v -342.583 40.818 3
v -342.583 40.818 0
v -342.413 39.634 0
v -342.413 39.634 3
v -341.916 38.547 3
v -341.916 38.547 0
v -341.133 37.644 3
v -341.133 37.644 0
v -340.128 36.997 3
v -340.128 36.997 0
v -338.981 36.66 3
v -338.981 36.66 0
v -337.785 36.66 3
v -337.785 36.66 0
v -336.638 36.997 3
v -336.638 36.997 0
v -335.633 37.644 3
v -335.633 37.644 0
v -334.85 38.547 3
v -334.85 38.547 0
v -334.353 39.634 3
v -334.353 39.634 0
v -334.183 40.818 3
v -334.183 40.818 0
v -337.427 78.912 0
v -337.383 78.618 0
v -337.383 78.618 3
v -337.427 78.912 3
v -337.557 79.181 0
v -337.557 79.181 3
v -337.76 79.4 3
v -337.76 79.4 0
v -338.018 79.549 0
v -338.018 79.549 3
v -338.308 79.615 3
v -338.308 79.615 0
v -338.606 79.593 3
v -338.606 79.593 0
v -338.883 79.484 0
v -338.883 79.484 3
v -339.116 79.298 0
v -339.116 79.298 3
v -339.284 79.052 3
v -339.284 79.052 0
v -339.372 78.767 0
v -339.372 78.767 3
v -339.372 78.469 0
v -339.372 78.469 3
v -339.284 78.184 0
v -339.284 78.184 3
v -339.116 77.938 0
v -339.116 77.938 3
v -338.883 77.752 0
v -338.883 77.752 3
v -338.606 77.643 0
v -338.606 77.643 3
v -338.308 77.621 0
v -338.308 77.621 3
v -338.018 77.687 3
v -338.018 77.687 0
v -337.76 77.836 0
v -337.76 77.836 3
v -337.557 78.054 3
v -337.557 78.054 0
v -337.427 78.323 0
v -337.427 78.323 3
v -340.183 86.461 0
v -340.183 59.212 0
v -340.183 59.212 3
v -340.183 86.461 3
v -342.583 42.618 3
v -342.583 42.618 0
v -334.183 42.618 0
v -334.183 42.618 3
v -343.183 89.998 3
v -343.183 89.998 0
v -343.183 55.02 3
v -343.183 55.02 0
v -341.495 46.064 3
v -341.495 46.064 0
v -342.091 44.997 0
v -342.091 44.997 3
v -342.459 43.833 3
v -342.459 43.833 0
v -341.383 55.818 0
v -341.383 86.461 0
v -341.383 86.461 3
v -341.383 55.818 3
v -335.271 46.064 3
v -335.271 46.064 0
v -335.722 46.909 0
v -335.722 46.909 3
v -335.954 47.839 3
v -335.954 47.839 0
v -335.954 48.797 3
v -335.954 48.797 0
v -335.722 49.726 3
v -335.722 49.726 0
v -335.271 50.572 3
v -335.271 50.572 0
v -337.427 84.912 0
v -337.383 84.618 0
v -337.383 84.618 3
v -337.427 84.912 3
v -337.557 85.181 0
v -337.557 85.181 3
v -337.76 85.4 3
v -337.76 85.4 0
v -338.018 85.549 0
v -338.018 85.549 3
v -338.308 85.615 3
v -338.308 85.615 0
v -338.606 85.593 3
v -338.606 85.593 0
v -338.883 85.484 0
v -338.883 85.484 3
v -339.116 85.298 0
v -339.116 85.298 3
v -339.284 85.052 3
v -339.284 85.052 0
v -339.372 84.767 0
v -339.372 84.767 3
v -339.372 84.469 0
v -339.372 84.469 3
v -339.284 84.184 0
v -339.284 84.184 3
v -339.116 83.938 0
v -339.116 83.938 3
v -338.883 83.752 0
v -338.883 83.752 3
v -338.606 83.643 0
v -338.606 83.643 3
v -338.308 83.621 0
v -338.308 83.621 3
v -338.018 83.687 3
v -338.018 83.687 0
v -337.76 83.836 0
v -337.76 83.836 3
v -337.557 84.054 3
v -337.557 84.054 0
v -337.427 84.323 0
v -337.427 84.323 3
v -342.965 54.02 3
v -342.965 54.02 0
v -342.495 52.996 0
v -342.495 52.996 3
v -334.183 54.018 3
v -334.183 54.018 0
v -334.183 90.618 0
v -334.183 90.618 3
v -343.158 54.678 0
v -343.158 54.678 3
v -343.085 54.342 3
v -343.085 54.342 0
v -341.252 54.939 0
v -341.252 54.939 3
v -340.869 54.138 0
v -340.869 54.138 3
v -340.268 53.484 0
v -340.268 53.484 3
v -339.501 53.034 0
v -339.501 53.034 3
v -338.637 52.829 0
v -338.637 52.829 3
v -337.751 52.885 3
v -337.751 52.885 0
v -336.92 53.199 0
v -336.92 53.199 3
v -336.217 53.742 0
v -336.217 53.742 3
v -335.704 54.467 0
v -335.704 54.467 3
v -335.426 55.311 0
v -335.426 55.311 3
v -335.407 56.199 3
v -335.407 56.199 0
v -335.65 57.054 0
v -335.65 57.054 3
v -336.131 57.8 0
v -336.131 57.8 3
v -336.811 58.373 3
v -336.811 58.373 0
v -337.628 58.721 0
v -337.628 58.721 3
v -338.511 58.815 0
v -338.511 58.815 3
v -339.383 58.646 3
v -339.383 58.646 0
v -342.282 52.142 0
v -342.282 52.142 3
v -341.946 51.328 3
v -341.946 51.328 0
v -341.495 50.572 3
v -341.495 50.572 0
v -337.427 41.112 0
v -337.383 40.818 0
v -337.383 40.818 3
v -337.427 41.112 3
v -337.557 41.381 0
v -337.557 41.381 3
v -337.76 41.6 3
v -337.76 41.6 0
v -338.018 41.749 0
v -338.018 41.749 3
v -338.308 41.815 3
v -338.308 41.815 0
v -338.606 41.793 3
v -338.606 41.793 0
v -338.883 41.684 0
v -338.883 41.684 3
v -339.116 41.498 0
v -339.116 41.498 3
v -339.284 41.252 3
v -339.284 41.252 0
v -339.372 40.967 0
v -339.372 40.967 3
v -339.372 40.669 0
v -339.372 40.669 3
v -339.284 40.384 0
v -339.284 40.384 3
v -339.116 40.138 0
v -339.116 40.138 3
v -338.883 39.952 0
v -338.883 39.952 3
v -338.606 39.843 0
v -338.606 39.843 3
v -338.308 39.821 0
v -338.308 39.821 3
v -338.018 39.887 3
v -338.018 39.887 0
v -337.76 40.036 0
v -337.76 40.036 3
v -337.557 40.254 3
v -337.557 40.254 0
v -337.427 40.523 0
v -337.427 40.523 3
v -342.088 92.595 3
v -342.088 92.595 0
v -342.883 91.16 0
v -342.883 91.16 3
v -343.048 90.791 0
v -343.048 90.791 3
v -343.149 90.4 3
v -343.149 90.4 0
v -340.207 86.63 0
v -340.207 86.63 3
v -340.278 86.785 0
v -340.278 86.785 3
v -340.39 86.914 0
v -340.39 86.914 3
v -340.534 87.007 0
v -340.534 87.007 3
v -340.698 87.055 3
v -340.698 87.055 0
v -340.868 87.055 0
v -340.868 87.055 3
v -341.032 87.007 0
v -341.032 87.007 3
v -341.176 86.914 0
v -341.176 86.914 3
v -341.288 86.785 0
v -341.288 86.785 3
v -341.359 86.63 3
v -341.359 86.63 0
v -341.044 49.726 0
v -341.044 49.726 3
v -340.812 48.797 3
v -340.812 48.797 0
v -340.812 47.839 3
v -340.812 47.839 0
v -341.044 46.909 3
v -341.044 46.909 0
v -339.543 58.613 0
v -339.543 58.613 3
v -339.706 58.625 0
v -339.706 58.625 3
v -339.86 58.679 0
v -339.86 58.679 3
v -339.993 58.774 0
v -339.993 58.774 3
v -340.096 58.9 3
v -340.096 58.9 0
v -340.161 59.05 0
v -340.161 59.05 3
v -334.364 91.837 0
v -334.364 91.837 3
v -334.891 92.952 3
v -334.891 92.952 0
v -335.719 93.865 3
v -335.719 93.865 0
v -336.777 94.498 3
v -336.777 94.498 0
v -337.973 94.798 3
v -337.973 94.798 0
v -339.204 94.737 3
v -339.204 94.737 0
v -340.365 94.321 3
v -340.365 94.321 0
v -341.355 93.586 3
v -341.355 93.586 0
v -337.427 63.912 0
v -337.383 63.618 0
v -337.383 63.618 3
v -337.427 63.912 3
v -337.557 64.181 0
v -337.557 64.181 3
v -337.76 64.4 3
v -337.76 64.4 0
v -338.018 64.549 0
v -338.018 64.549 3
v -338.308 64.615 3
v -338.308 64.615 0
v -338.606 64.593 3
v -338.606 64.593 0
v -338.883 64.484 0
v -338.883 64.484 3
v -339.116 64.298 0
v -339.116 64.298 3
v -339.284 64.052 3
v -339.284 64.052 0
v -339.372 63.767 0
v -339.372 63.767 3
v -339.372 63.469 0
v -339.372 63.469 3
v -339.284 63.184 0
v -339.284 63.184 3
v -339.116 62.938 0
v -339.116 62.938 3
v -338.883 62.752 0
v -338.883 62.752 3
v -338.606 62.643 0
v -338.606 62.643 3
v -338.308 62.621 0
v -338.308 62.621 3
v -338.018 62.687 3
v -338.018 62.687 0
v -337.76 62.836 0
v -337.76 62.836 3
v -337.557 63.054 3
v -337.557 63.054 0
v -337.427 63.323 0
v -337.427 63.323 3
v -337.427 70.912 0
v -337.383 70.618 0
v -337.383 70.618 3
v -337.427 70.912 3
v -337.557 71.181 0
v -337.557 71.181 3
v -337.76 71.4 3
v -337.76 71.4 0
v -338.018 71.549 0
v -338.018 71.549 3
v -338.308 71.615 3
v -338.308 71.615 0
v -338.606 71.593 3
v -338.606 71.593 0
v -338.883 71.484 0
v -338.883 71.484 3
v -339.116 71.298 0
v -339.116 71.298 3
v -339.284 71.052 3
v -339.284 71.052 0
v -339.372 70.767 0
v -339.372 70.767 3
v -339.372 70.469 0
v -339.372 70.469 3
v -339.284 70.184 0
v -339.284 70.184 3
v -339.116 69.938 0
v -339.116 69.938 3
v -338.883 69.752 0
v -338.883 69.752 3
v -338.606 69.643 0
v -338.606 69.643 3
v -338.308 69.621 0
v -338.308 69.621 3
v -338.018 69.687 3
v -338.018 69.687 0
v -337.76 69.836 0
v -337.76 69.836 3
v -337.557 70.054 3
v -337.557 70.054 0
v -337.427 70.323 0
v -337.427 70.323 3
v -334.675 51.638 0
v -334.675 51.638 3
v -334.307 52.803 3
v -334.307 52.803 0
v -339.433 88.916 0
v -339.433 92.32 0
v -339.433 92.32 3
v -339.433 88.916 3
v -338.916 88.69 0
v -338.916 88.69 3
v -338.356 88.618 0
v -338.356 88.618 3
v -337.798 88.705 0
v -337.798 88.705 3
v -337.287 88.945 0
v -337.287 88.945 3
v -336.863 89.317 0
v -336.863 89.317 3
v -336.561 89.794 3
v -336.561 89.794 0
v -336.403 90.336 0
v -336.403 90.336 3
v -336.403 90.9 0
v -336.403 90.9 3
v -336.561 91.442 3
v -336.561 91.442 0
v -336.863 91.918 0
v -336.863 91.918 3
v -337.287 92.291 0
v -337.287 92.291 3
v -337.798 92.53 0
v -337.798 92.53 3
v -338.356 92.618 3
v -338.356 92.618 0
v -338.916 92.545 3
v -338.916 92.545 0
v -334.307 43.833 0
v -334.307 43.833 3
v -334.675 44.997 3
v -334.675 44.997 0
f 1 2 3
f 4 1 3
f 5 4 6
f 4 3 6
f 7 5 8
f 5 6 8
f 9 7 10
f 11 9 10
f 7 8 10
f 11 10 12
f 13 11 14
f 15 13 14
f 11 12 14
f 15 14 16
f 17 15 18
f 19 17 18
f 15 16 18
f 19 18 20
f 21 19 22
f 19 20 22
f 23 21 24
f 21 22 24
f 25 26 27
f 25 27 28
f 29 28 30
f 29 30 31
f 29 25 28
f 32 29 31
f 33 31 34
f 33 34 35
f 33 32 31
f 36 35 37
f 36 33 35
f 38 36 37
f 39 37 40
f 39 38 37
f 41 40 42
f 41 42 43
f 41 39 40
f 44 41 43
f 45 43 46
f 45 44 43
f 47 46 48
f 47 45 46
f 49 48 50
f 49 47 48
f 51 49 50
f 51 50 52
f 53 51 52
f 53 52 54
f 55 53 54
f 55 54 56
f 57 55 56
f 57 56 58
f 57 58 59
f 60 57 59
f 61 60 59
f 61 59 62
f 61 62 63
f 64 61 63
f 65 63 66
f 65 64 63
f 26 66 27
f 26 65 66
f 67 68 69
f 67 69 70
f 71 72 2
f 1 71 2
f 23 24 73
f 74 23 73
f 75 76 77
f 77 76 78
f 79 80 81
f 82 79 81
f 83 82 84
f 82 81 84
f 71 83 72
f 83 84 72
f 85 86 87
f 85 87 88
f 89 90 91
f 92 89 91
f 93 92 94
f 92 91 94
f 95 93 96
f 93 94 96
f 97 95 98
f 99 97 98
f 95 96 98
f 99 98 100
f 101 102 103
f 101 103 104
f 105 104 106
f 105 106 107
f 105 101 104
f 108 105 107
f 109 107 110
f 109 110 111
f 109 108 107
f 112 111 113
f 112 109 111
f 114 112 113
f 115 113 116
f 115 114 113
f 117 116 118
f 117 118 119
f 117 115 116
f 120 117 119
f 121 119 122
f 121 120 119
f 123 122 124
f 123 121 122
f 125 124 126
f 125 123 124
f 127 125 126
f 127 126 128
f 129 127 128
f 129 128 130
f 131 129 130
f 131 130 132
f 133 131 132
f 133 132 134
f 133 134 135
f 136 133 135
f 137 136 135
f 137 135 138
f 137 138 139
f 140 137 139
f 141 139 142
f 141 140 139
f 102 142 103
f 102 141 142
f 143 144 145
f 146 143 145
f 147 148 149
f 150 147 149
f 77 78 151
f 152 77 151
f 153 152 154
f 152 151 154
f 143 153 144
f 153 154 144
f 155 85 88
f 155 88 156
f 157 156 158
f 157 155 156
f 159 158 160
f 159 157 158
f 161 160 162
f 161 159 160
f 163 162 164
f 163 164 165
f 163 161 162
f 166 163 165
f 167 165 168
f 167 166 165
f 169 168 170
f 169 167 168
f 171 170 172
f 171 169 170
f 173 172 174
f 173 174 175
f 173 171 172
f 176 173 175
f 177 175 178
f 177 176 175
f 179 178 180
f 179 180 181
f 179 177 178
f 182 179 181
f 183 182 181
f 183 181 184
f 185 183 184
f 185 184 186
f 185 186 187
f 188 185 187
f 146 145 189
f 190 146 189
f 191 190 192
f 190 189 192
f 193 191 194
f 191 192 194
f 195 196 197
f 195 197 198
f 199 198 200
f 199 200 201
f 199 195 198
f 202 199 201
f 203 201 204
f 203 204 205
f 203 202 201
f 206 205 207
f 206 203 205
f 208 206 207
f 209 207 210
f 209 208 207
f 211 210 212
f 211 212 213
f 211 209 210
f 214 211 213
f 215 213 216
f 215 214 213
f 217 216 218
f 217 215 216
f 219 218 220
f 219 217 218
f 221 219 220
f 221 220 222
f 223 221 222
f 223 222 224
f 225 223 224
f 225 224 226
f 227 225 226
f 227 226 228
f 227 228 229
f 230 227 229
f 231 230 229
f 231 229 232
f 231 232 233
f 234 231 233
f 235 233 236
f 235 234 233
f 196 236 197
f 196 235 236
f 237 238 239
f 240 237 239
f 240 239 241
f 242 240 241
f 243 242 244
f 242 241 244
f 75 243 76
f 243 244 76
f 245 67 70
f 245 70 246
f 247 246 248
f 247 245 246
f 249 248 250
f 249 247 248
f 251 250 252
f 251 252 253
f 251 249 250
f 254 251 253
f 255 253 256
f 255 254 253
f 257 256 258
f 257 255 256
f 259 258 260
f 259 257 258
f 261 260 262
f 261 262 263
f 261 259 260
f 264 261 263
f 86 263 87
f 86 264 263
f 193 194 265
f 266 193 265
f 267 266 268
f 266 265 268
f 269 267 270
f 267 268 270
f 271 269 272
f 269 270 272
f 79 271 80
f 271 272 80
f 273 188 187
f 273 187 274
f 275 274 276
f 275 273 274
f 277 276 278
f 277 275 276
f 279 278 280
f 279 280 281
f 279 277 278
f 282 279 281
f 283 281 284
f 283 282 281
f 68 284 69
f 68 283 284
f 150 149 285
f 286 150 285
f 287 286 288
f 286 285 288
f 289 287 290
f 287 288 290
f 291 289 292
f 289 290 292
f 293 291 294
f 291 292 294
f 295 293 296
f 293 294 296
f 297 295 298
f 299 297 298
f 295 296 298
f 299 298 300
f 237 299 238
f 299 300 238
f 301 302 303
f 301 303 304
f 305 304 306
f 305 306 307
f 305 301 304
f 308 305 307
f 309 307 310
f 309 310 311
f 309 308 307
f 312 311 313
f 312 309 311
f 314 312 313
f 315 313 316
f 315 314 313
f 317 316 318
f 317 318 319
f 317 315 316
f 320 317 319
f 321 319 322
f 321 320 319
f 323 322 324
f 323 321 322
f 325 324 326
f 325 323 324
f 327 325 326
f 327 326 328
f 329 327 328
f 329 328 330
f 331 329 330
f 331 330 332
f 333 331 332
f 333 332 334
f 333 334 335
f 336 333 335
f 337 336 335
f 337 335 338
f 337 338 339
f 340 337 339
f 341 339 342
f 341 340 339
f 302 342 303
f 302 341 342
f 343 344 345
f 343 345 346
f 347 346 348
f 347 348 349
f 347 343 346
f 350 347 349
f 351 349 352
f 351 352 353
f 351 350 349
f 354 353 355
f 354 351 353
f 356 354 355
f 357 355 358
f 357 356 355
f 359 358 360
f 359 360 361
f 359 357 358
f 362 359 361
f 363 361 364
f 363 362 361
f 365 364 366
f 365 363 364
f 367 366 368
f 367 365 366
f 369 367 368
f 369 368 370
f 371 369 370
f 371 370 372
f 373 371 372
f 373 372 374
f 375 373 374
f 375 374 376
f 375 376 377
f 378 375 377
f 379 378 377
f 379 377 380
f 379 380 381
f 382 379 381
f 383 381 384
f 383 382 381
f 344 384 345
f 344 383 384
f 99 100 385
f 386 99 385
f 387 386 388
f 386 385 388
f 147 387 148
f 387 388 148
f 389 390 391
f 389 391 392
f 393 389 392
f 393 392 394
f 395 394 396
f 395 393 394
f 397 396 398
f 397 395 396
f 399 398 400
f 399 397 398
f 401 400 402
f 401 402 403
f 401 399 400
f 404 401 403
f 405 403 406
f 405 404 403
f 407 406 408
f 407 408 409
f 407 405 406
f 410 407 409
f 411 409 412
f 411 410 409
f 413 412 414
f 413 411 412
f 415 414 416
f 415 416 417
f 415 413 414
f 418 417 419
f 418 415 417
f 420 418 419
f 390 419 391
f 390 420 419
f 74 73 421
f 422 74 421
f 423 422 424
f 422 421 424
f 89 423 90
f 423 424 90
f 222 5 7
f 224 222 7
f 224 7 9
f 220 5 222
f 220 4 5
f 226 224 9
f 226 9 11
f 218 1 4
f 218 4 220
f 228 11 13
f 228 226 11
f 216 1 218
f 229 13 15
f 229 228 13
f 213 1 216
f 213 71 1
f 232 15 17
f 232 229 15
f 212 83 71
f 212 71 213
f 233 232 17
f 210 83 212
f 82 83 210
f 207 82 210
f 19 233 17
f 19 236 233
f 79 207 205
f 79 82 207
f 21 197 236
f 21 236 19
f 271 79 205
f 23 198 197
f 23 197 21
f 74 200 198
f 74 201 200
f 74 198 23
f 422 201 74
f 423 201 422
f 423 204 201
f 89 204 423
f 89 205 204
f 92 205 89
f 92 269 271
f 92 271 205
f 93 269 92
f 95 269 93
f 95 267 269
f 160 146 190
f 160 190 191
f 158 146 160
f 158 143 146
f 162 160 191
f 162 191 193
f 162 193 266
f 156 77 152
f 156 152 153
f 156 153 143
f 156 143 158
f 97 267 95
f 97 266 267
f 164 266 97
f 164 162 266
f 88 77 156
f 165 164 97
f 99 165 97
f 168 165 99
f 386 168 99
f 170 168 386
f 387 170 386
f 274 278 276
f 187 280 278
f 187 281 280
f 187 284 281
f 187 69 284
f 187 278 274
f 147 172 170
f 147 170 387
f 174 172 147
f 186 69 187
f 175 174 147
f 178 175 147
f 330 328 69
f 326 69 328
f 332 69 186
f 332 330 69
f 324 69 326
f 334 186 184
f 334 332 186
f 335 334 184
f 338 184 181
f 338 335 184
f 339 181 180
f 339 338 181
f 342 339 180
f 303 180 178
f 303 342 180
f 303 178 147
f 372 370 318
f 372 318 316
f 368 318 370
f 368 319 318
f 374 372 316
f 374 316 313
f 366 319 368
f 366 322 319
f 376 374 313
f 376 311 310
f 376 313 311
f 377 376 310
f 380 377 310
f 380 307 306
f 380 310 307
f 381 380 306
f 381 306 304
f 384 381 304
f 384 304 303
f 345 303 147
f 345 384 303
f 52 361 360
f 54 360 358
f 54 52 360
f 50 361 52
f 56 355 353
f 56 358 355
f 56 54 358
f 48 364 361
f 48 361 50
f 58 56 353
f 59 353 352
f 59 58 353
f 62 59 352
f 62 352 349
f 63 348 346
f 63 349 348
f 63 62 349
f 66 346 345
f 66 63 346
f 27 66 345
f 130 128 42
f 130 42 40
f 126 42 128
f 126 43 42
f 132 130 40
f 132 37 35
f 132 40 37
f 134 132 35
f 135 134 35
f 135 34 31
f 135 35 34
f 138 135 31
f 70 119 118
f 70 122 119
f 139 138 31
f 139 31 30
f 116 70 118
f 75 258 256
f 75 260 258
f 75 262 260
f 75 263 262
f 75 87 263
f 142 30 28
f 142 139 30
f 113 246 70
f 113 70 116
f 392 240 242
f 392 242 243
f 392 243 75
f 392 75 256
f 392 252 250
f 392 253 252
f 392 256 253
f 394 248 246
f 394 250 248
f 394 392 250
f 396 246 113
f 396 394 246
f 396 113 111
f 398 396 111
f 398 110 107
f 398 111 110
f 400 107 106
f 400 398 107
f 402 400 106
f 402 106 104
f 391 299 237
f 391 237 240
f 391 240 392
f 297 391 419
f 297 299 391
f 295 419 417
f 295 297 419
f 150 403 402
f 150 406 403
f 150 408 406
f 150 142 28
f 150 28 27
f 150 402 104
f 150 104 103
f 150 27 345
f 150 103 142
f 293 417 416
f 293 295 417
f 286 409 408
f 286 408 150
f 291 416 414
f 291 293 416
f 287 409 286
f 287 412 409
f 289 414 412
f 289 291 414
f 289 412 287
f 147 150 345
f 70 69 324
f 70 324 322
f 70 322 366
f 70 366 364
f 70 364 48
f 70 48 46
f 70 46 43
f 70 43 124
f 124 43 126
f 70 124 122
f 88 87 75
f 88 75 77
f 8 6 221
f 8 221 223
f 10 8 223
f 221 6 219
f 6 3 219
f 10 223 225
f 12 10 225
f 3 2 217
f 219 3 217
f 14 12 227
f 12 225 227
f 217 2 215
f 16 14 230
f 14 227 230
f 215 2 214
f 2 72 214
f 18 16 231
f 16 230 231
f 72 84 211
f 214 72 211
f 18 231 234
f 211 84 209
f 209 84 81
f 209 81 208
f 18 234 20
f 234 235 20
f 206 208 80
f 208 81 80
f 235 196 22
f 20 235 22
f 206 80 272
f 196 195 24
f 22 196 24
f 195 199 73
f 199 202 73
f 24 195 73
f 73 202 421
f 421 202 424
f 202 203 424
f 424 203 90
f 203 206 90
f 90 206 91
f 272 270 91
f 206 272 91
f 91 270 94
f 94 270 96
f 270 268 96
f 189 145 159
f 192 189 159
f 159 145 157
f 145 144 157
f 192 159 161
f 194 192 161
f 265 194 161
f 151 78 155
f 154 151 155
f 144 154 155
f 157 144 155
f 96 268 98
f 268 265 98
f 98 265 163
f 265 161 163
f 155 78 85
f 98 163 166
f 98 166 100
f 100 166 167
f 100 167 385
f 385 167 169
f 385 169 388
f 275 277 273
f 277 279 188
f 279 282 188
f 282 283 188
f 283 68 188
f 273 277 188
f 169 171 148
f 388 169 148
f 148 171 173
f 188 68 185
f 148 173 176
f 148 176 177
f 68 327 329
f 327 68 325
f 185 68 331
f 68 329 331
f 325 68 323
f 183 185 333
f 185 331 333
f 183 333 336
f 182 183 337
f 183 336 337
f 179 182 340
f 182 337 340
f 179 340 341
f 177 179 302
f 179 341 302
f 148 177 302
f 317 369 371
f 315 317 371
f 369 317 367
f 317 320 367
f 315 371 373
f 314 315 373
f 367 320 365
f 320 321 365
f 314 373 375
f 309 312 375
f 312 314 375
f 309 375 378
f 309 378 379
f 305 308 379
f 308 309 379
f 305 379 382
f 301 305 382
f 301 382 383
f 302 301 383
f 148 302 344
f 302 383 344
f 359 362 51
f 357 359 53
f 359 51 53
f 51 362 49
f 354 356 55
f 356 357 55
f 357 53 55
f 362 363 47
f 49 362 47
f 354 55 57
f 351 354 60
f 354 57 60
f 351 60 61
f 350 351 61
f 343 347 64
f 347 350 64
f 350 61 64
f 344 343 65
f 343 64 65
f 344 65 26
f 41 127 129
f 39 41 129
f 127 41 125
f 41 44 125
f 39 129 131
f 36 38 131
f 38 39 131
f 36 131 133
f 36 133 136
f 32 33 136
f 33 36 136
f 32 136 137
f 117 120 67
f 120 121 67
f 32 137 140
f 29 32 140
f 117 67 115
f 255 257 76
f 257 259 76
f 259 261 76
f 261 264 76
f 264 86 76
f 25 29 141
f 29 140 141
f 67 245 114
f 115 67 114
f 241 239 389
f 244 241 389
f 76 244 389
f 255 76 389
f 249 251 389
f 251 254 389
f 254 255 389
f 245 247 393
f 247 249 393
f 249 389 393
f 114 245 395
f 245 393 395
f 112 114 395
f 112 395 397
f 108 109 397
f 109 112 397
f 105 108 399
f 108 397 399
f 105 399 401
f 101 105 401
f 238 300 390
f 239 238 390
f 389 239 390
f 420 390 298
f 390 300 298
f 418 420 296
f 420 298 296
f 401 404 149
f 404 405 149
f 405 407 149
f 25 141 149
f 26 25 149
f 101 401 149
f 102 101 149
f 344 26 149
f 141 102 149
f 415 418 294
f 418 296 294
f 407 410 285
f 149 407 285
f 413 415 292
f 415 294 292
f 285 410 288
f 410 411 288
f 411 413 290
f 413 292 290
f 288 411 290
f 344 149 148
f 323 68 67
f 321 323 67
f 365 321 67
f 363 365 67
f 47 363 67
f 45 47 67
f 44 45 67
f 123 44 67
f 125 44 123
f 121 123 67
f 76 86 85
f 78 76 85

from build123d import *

# Parameters (mm, degrees)
SKETCH_1_R      = 1
EXTRUDE_1_DEPTH = 3


with BuildPart() as part:
    # 草图1 → 凸台-拉伸1 (new body)
    with BuildSketch(Plane.XY):
        with BuildLine():
            Line((-334.183039587, 54.017725717), (-334.183039587, 90.617725717))
            ThreePointArc((-334.183039587, 90.617725717), (-337.363809396, 94.692179032), (-342.088358548, 92.595252304))
            Line((-342.088358548, 92.595252304), (-342.882792815, 91.160117477))
            ThreePointArc((-342.882792815, 91.160117477), (-343.106765877, 90.598023292), (-343.183039587, 89.99777657))
            Line((-343.183039587, 89.99777657), (-343.183039587, 55.020224039))
            ThreePointArc((-343.183039587, 55.020224039), (-343.127859797, 54.508542317), (-342.964857766, 54.020389337))
            Line((-342.964857766, 54.020389337), (-342.495395341, 52.995938343))
            ThreePointArc((-342.495395341, 52.995938343), (-342.129192245, 51.728579438), (-341.494878378, 50.571881888))
            ThreePointArc((-341.494878378, 50.571881888), (-340.783039587, 48.317725717), (-341.494878378, 46.063569546))
            ThreePointArc((-341.494878378, 46.063569546), (-342.304535578, 44.424513925), (-342.583039587, 42.617725717))
            Line((-342.583039587, 42.617725717), (-342.583039587, 40.817725717))
            ThreePointArc((-342.583039587, 40.817725717), (-338.383039587, 36.617725717), (-334.183039587, 40.817725717))
            Line((-334.183039587, 40.817725717), (-334.183039587, 42.617725717))
            ThreePointArc((-334.183039587, 42.617725717), (-334.461543596, 44.424513925), (-335.271200796, 46.063569546))
            ThreePointArc((-335.271200796, 46.063569546), (-335.983039587, 48.317725717), (-335.271200796, 50.571881888))
            ThreePointArc((-335.271200796, 50.571881888), (-334.461543596, 52.21093751), (-334.183039587, 54.017725717))
        make_face()
        with Locations((-338.383039587, 84.617725717)):
            Circle(SKETCH_1_R, mode=Mode.SUBTRACT)
        with Locations((-338.383039587, 78.617725717)):
            Circle(SKETCH_1_R, mode=Mode.SUBTRACT)
        with Locations((-338.383039587, 40.817725717)):
            Circle(SKETCH_1_R, mode=Mode.SUBTRACT)
        with Locations((-338.383039587, 63.617725717)):
            Circle(SKETCH_1_R, mode=Mode.SUBTRACT)
        with Locations((-338.383039587, 70.617725717)):
            Circle(SKETCH_1_R, mode=Mode.SUBTRACT)
        with BuildLine():
            Line((-340.183039587, 59.211838267), (-340.183039587, 86.460803779))
            ThreePointArc((-340.183039587, 86.460803779), (-340.783039587, 87.060803779), (-341.383039587, 86.460803779))
            Line((-341.383039587, 86.460803779), (-341.383039587, 55.817725717))
            ThreePointArc((-341.383039587, 55.817725717), (-335.933549844, 54.08567491), (-339.383039587, 58.646152842))
            ThreePointArc((-339.383039587, 58.646152842), (-339.929449749, 58.721940318), (-340.183039587, 59.211838267))
        make_face(mode=Mode.SUBTRACT)
        with BuildLine():
            Line((-339.433039587, 90.617725717), (-339.433039587, 88.915521264))
            ThreePointArc((-339.433039587, 88.915521264), (-336.383039587, 90.617725717), (-339.433039587, 92.31993017))
            Line((-339.433039587, 92.31993017), (-339.433039587, 90.617725717))
        make_face(mode=Mode.SUBTRACT)
    extrude(amount=EXTRUDE_1_DEPTH)


solid = part.part
